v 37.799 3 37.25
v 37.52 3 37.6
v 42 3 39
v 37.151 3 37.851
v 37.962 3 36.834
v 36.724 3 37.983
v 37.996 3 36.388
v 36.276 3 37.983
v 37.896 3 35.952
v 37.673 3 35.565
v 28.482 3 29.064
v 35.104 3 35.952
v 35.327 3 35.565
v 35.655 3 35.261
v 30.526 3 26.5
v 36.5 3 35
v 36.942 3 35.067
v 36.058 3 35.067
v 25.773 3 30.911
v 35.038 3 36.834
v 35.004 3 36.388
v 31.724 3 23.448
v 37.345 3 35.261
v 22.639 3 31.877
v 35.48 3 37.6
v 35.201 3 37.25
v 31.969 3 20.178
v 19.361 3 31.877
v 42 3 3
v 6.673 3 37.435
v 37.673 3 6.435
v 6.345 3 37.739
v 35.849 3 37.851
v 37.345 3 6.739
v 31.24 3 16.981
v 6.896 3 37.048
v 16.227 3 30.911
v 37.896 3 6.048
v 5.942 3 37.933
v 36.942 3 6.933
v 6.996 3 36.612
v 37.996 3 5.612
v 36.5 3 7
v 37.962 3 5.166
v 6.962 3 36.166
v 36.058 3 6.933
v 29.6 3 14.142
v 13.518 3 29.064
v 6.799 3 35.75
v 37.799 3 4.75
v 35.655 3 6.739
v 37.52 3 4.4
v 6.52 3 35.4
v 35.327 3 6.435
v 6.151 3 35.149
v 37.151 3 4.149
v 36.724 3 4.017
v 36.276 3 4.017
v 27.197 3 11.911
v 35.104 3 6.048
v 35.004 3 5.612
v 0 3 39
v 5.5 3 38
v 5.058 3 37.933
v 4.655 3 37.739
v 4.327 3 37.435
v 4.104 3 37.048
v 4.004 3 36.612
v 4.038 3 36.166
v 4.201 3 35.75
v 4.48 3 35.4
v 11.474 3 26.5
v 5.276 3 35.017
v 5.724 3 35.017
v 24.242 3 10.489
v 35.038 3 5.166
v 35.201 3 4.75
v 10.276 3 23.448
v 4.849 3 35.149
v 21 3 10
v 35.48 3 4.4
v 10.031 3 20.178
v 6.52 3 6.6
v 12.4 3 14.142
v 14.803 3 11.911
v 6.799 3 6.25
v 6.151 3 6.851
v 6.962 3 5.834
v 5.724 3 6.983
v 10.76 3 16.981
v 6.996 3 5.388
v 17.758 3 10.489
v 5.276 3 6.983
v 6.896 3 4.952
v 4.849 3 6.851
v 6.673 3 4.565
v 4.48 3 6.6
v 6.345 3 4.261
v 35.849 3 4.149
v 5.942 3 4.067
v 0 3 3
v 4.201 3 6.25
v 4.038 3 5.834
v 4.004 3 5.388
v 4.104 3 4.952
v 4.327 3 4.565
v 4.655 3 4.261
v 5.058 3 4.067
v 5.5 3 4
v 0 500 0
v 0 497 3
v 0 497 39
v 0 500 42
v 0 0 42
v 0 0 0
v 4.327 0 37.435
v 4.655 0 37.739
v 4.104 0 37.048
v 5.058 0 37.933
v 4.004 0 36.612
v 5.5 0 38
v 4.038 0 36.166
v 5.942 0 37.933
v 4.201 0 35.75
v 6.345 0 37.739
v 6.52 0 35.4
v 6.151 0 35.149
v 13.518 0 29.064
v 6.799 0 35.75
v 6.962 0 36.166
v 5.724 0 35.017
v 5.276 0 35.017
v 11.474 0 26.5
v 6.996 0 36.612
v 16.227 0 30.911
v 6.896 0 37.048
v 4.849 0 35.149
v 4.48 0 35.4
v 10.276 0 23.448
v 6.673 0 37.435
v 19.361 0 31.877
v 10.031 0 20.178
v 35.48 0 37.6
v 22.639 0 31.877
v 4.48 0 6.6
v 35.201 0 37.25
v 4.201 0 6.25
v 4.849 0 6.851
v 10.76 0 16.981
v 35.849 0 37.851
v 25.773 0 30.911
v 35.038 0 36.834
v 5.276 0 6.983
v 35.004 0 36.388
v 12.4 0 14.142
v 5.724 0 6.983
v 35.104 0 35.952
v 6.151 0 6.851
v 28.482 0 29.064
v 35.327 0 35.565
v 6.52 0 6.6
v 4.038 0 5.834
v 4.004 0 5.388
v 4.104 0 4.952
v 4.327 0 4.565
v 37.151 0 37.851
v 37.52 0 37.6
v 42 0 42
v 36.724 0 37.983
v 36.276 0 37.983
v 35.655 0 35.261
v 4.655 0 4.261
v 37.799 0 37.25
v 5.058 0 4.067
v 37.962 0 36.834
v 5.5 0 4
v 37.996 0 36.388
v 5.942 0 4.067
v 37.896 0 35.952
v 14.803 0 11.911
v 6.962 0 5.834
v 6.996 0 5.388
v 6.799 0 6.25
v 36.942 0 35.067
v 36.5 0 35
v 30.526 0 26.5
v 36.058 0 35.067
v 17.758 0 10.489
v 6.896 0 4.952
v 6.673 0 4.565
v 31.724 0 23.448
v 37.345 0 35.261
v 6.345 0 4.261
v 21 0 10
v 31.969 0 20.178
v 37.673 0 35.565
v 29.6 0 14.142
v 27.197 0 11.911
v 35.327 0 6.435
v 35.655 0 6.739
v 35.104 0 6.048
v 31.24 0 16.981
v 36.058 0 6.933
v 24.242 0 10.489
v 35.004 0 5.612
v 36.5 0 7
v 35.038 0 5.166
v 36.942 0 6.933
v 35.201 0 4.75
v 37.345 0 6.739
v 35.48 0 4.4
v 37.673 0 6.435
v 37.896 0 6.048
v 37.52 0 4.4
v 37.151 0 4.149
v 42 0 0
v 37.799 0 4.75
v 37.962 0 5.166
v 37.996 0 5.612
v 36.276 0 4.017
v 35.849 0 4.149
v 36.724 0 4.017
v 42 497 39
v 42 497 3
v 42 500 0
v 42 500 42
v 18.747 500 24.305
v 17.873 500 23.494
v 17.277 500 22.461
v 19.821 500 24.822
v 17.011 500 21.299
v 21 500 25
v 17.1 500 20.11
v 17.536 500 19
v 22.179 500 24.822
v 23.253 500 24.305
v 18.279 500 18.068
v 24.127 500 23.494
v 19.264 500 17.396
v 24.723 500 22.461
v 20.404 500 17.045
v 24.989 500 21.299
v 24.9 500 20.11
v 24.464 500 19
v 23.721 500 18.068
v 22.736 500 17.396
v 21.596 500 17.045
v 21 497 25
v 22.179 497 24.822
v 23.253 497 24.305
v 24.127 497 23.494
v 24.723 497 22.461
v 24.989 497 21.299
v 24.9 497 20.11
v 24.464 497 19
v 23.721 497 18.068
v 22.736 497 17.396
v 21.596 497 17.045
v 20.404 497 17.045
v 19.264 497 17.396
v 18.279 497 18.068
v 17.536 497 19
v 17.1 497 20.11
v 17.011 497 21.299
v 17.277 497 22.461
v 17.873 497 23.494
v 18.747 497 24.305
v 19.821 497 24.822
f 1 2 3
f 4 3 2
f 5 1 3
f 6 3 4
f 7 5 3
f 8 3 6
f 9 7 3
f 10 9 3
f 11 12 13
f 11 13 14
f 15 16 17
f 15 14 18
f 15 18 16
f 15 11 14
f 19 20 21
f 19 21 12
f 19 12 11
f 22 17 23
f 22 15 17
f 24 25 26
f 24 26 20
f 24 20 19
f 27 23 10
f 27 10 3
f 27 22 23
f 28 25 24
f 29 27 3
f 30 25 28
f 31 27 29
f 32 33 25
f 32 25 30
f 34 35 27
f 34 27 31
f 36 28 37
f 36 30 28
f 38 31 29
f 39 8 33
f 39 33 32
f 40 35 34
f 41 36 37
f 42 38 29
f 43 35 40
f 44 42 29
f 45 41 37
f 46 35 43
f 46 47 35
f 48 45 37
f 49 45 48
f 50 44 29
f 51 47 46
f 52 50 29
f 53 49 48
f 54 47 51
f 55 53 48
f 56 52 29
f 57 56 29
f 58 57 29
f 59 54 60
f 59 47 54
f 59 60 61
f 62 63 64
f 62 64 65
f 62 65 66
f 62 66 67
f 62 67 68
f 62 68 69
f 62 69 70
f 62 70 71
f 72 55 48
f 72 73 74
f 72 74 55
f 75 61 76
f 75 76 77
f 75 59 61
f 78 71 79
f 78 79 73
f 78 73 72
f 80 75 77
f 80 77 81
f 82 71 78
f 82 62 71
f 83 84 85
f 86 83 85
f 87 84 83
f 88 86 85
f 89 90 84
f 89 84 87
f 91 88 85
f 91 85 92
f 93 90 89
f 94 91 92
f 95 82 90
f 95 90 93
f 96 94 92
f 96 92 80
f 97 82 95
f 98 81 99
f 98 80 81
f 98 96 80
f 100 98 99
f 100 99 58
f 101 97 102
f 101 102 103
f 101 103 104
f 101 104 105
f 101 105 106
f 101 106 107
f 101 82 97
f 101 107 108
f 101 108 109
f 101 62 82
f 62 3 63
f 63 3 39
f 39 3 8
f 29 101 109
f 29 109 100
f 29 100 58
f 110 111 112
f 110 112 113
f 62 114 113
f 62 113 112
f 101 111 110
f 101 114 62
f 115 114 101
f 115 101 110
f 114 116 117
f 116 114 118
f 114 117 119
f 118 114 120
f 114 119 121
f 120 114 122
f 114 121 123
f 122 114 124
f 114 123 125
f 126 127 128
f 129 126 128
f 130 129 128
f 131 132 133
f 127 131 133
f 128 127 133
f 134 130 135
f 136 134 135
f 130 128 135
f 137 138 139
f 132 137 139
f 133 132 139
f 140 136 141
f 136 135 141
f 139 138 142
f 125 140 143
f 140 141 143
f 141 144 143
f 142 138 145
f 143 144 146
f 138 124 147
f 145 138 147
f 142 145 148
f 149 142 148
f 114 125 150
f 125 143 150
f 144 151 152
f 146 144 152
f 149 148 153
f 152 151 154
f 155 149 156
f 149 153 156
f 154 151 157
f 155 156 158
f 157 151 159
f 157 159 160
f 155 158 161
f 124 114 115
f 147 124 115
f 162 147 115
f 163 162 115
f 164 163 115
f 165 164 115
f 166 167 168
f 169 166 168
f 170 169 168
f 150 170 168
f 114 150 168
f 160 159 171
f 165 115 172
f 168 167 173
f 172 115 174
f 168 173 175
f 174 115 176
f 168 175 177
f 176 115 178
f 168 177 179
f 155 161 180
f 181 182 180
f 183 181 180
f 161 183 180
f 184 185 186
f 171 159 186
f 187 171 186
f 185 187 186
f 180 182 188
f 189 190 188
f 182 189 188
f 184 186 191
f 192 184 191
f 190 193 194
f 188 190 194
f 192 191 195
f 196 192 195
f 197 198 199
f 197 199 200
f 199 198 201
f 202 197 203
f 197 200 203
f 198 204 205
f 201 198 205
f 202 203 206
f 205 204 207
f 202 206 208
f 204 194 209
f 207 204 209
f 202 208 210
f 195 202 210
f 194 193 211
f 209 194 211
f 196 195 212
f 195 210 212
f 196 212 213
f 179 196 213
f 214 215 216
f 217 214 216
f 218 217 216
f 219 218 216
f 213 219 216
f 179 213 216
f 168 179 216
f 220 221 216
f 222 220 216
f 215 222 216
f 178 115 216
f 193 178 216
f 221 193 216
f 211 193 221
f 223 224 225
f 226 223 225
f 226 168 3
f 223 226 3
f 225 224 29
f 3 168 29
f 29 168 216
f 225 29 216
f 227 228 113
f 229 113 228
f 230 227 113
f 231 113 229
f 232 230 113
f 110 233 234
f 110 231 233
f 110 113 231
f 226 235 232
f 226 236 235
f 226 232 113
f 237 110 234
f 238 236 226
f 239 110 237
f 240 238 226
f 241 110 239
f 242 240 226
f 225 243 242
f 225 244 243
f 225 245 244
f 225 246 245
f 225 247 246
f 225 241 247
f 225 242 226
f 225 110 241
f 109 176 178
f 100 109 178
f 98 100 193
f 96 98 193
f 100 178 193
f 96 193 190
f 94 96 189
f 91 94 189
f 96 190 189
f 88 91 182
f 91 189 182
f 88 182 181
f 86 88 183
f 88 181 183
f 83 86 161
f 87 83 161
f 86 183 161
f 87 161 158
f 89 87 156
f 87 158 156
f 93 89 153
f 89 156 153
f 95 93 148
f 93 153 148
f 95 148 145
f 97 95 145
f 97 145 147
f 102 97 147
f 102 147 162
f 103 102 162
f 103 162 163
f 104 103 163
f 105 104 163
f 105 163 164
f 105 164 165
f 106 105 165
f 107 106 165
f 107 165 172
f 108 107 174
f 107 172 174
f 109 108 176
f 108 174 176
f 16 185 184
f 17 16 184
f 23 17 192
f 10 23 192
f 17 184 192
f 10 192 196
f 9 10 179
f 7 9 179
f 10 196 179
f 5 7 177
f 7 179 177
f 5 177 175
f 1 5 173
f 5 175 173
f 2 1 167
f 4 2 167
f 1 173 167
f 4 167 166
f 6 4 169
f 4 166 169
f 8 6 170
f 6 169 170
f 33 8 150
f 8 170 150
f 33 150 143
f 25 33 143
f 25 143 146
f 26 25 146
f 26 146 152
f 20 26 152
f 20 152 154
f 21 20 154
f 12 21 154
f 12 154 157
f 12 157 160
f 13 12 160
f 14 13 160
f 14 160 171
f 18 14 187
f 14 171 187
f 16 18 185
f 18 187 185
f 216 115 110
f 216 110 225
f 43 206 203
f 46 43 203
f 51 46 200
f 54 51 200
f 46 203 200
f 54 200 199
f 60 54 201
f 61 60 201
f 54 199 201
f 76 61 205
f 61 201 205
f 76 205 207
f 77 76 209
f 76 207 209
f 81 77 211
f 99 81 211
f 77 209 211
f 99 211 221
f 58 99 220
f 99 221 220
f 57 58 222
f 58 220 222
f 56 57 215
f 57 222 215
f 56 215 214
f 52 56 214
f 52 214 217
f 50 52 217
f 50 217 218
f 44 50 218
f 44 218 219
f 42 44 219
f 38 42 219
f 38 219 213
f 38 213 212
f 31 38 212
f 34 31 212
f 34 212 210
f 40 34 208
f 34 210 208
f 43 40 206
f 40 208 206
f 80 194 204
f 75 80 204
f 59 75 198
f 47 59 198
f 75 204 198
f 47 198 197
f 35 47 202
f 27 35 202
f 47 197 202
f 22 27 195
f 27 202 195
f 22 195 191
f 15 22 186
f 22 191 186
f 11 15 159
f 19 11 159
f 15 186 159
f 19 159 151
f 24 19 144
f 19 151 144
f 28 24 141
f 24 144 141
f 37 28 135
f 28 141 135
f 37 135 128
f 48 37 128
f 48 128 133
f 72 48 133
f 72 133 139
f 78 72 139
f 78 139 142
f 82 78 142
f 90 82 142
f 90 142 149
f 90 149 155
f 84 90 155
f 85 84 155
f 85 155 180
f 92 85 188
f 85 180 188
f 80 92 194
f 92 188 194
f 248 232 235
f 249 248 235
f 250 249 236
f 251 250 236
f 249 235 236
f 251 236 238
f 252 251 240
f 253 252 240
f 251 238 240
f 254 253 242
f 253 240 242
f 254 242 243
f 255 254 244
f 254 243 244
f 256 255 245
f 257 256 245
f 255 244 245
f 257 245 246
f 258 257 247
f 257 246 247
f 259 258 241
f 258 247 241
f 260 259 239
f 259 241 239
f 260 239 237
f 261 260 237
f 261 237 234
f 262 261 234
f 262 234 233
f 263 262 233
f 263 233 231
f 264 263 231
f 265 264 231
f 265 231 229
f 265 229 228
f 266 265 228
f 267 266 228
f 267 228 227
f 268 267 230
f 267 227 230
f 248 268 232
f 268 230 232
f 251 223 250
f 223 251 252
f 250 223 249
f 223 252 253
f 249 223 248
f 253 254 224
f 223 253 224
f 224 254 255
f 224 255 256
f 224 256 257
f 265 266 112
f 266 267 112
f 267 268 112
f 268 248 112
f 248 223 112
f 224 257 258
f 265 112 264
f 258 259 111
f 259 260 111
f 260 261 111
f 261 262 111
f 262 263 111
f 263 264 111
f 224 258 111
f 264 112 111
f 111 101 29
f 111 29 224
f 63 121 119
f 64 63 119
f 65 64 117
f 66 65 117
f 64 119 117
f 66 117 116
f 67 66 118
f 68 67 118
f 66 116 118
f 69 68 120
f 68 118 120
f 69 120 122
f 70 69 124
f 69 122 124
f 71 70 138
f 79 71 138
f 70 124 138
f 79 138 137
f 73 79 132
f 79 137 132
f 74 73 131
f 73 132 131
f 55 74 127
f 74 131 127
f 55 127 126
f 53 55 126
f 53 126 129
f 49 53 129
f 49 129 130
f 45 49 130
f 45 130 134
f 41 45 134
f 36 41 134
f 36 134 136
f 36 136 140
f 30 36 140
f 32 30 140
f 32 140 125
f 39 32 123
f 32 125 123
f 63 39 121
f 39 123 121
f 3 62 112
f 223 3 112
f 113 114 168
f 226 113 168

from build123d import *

# Parameters (mm, degrees)
SKETCH_1_W          = 42
SKETCH_1_H          = 42
EXTRUDE_1_DEPTH     = 500
SKETCH_2_R          = 11
SKETCH_2_R_2        = 1.5
CUT_EXTRUDE_1_DEPTH = 3
SKETCH_3_R          = 4
CUT_EXTRUDE_2_DEPTH = 3
SKETCH_4_W          = 36
SKETCH_4_H          = 494
CUT_EXTRUDE_3_DEPTH = 504.515640273


with BuildPart() as part:
    # 草图1 → 凸台-拉伸1 (new body)
    with BuildSketch(Plane(origin=(0, 0, 0), x_dir=(1, 0, 0), z_dir=(0, 1, 0))):
        with Locations((21, -21)):
            Rectangle(SKETCH_1_W, SKETCH_1_H)
    extrude(amount=EXTRUDE_1_DEPTH)

    # 草图2 → 切除-拉伸1 (cut)
    with BuildSketch(Plane.XZ):
        with Locations(Location((21, 21, 0), (0, 0, 270))):
            Circle(SKETCH_2_R)
        with Locations(Location((5.5, 5.5, 0), (0, 0, 270))):
            Circle(SKETCH_2_R_2)
        with Locations(Location((5.5, 36.5, 0), (0, 0, 90))):
            Circle(SKETCH_2_R_2)
        with Locations(Location((36.5, 5.5, 0), (0, 0, 90))):
            Circle(SKETCH_2_R_2)
        with Locations(Location((36.5, 36.5, 0), (0, 0, 270))):
            Circle(SKETCH_2_R_2)
    extrude(amount=-CUT_EXTRUDE_1_DEPTH, mode=Mode.SUBTRACT)

    # 草图3 → 切除-拉伸2 (cut)
    with BuildSketch(Plane(origin=(0, 500, 0), x_dir=(1, 0, 0), z_dir=(0, 1, 0))):
        with Locations(Location((21, -21, 0), (0, 0, 270))):
            Circle(SKETCH_3_R)
    extrude(amount=-CUT_EXTRUDE_2_DEPTH, mode=Mode.SUBTRACT)

    # 草图4 → 切除-拉伸3 (cut, through all)
    with BuildSketch(Plane(origin=(0, 0, 0), x_dir=(0, 0, -1), z_dir=(1, 0, 0))):
        with Locations((-21, 250)):
            Rectangle(SKETCH_4_W, SKETCH_4_H)
    extrude(amount=CUT_EXTRUDE_3_DEPTH, mode=Mode.SUBTRACT)


solid = part.part
